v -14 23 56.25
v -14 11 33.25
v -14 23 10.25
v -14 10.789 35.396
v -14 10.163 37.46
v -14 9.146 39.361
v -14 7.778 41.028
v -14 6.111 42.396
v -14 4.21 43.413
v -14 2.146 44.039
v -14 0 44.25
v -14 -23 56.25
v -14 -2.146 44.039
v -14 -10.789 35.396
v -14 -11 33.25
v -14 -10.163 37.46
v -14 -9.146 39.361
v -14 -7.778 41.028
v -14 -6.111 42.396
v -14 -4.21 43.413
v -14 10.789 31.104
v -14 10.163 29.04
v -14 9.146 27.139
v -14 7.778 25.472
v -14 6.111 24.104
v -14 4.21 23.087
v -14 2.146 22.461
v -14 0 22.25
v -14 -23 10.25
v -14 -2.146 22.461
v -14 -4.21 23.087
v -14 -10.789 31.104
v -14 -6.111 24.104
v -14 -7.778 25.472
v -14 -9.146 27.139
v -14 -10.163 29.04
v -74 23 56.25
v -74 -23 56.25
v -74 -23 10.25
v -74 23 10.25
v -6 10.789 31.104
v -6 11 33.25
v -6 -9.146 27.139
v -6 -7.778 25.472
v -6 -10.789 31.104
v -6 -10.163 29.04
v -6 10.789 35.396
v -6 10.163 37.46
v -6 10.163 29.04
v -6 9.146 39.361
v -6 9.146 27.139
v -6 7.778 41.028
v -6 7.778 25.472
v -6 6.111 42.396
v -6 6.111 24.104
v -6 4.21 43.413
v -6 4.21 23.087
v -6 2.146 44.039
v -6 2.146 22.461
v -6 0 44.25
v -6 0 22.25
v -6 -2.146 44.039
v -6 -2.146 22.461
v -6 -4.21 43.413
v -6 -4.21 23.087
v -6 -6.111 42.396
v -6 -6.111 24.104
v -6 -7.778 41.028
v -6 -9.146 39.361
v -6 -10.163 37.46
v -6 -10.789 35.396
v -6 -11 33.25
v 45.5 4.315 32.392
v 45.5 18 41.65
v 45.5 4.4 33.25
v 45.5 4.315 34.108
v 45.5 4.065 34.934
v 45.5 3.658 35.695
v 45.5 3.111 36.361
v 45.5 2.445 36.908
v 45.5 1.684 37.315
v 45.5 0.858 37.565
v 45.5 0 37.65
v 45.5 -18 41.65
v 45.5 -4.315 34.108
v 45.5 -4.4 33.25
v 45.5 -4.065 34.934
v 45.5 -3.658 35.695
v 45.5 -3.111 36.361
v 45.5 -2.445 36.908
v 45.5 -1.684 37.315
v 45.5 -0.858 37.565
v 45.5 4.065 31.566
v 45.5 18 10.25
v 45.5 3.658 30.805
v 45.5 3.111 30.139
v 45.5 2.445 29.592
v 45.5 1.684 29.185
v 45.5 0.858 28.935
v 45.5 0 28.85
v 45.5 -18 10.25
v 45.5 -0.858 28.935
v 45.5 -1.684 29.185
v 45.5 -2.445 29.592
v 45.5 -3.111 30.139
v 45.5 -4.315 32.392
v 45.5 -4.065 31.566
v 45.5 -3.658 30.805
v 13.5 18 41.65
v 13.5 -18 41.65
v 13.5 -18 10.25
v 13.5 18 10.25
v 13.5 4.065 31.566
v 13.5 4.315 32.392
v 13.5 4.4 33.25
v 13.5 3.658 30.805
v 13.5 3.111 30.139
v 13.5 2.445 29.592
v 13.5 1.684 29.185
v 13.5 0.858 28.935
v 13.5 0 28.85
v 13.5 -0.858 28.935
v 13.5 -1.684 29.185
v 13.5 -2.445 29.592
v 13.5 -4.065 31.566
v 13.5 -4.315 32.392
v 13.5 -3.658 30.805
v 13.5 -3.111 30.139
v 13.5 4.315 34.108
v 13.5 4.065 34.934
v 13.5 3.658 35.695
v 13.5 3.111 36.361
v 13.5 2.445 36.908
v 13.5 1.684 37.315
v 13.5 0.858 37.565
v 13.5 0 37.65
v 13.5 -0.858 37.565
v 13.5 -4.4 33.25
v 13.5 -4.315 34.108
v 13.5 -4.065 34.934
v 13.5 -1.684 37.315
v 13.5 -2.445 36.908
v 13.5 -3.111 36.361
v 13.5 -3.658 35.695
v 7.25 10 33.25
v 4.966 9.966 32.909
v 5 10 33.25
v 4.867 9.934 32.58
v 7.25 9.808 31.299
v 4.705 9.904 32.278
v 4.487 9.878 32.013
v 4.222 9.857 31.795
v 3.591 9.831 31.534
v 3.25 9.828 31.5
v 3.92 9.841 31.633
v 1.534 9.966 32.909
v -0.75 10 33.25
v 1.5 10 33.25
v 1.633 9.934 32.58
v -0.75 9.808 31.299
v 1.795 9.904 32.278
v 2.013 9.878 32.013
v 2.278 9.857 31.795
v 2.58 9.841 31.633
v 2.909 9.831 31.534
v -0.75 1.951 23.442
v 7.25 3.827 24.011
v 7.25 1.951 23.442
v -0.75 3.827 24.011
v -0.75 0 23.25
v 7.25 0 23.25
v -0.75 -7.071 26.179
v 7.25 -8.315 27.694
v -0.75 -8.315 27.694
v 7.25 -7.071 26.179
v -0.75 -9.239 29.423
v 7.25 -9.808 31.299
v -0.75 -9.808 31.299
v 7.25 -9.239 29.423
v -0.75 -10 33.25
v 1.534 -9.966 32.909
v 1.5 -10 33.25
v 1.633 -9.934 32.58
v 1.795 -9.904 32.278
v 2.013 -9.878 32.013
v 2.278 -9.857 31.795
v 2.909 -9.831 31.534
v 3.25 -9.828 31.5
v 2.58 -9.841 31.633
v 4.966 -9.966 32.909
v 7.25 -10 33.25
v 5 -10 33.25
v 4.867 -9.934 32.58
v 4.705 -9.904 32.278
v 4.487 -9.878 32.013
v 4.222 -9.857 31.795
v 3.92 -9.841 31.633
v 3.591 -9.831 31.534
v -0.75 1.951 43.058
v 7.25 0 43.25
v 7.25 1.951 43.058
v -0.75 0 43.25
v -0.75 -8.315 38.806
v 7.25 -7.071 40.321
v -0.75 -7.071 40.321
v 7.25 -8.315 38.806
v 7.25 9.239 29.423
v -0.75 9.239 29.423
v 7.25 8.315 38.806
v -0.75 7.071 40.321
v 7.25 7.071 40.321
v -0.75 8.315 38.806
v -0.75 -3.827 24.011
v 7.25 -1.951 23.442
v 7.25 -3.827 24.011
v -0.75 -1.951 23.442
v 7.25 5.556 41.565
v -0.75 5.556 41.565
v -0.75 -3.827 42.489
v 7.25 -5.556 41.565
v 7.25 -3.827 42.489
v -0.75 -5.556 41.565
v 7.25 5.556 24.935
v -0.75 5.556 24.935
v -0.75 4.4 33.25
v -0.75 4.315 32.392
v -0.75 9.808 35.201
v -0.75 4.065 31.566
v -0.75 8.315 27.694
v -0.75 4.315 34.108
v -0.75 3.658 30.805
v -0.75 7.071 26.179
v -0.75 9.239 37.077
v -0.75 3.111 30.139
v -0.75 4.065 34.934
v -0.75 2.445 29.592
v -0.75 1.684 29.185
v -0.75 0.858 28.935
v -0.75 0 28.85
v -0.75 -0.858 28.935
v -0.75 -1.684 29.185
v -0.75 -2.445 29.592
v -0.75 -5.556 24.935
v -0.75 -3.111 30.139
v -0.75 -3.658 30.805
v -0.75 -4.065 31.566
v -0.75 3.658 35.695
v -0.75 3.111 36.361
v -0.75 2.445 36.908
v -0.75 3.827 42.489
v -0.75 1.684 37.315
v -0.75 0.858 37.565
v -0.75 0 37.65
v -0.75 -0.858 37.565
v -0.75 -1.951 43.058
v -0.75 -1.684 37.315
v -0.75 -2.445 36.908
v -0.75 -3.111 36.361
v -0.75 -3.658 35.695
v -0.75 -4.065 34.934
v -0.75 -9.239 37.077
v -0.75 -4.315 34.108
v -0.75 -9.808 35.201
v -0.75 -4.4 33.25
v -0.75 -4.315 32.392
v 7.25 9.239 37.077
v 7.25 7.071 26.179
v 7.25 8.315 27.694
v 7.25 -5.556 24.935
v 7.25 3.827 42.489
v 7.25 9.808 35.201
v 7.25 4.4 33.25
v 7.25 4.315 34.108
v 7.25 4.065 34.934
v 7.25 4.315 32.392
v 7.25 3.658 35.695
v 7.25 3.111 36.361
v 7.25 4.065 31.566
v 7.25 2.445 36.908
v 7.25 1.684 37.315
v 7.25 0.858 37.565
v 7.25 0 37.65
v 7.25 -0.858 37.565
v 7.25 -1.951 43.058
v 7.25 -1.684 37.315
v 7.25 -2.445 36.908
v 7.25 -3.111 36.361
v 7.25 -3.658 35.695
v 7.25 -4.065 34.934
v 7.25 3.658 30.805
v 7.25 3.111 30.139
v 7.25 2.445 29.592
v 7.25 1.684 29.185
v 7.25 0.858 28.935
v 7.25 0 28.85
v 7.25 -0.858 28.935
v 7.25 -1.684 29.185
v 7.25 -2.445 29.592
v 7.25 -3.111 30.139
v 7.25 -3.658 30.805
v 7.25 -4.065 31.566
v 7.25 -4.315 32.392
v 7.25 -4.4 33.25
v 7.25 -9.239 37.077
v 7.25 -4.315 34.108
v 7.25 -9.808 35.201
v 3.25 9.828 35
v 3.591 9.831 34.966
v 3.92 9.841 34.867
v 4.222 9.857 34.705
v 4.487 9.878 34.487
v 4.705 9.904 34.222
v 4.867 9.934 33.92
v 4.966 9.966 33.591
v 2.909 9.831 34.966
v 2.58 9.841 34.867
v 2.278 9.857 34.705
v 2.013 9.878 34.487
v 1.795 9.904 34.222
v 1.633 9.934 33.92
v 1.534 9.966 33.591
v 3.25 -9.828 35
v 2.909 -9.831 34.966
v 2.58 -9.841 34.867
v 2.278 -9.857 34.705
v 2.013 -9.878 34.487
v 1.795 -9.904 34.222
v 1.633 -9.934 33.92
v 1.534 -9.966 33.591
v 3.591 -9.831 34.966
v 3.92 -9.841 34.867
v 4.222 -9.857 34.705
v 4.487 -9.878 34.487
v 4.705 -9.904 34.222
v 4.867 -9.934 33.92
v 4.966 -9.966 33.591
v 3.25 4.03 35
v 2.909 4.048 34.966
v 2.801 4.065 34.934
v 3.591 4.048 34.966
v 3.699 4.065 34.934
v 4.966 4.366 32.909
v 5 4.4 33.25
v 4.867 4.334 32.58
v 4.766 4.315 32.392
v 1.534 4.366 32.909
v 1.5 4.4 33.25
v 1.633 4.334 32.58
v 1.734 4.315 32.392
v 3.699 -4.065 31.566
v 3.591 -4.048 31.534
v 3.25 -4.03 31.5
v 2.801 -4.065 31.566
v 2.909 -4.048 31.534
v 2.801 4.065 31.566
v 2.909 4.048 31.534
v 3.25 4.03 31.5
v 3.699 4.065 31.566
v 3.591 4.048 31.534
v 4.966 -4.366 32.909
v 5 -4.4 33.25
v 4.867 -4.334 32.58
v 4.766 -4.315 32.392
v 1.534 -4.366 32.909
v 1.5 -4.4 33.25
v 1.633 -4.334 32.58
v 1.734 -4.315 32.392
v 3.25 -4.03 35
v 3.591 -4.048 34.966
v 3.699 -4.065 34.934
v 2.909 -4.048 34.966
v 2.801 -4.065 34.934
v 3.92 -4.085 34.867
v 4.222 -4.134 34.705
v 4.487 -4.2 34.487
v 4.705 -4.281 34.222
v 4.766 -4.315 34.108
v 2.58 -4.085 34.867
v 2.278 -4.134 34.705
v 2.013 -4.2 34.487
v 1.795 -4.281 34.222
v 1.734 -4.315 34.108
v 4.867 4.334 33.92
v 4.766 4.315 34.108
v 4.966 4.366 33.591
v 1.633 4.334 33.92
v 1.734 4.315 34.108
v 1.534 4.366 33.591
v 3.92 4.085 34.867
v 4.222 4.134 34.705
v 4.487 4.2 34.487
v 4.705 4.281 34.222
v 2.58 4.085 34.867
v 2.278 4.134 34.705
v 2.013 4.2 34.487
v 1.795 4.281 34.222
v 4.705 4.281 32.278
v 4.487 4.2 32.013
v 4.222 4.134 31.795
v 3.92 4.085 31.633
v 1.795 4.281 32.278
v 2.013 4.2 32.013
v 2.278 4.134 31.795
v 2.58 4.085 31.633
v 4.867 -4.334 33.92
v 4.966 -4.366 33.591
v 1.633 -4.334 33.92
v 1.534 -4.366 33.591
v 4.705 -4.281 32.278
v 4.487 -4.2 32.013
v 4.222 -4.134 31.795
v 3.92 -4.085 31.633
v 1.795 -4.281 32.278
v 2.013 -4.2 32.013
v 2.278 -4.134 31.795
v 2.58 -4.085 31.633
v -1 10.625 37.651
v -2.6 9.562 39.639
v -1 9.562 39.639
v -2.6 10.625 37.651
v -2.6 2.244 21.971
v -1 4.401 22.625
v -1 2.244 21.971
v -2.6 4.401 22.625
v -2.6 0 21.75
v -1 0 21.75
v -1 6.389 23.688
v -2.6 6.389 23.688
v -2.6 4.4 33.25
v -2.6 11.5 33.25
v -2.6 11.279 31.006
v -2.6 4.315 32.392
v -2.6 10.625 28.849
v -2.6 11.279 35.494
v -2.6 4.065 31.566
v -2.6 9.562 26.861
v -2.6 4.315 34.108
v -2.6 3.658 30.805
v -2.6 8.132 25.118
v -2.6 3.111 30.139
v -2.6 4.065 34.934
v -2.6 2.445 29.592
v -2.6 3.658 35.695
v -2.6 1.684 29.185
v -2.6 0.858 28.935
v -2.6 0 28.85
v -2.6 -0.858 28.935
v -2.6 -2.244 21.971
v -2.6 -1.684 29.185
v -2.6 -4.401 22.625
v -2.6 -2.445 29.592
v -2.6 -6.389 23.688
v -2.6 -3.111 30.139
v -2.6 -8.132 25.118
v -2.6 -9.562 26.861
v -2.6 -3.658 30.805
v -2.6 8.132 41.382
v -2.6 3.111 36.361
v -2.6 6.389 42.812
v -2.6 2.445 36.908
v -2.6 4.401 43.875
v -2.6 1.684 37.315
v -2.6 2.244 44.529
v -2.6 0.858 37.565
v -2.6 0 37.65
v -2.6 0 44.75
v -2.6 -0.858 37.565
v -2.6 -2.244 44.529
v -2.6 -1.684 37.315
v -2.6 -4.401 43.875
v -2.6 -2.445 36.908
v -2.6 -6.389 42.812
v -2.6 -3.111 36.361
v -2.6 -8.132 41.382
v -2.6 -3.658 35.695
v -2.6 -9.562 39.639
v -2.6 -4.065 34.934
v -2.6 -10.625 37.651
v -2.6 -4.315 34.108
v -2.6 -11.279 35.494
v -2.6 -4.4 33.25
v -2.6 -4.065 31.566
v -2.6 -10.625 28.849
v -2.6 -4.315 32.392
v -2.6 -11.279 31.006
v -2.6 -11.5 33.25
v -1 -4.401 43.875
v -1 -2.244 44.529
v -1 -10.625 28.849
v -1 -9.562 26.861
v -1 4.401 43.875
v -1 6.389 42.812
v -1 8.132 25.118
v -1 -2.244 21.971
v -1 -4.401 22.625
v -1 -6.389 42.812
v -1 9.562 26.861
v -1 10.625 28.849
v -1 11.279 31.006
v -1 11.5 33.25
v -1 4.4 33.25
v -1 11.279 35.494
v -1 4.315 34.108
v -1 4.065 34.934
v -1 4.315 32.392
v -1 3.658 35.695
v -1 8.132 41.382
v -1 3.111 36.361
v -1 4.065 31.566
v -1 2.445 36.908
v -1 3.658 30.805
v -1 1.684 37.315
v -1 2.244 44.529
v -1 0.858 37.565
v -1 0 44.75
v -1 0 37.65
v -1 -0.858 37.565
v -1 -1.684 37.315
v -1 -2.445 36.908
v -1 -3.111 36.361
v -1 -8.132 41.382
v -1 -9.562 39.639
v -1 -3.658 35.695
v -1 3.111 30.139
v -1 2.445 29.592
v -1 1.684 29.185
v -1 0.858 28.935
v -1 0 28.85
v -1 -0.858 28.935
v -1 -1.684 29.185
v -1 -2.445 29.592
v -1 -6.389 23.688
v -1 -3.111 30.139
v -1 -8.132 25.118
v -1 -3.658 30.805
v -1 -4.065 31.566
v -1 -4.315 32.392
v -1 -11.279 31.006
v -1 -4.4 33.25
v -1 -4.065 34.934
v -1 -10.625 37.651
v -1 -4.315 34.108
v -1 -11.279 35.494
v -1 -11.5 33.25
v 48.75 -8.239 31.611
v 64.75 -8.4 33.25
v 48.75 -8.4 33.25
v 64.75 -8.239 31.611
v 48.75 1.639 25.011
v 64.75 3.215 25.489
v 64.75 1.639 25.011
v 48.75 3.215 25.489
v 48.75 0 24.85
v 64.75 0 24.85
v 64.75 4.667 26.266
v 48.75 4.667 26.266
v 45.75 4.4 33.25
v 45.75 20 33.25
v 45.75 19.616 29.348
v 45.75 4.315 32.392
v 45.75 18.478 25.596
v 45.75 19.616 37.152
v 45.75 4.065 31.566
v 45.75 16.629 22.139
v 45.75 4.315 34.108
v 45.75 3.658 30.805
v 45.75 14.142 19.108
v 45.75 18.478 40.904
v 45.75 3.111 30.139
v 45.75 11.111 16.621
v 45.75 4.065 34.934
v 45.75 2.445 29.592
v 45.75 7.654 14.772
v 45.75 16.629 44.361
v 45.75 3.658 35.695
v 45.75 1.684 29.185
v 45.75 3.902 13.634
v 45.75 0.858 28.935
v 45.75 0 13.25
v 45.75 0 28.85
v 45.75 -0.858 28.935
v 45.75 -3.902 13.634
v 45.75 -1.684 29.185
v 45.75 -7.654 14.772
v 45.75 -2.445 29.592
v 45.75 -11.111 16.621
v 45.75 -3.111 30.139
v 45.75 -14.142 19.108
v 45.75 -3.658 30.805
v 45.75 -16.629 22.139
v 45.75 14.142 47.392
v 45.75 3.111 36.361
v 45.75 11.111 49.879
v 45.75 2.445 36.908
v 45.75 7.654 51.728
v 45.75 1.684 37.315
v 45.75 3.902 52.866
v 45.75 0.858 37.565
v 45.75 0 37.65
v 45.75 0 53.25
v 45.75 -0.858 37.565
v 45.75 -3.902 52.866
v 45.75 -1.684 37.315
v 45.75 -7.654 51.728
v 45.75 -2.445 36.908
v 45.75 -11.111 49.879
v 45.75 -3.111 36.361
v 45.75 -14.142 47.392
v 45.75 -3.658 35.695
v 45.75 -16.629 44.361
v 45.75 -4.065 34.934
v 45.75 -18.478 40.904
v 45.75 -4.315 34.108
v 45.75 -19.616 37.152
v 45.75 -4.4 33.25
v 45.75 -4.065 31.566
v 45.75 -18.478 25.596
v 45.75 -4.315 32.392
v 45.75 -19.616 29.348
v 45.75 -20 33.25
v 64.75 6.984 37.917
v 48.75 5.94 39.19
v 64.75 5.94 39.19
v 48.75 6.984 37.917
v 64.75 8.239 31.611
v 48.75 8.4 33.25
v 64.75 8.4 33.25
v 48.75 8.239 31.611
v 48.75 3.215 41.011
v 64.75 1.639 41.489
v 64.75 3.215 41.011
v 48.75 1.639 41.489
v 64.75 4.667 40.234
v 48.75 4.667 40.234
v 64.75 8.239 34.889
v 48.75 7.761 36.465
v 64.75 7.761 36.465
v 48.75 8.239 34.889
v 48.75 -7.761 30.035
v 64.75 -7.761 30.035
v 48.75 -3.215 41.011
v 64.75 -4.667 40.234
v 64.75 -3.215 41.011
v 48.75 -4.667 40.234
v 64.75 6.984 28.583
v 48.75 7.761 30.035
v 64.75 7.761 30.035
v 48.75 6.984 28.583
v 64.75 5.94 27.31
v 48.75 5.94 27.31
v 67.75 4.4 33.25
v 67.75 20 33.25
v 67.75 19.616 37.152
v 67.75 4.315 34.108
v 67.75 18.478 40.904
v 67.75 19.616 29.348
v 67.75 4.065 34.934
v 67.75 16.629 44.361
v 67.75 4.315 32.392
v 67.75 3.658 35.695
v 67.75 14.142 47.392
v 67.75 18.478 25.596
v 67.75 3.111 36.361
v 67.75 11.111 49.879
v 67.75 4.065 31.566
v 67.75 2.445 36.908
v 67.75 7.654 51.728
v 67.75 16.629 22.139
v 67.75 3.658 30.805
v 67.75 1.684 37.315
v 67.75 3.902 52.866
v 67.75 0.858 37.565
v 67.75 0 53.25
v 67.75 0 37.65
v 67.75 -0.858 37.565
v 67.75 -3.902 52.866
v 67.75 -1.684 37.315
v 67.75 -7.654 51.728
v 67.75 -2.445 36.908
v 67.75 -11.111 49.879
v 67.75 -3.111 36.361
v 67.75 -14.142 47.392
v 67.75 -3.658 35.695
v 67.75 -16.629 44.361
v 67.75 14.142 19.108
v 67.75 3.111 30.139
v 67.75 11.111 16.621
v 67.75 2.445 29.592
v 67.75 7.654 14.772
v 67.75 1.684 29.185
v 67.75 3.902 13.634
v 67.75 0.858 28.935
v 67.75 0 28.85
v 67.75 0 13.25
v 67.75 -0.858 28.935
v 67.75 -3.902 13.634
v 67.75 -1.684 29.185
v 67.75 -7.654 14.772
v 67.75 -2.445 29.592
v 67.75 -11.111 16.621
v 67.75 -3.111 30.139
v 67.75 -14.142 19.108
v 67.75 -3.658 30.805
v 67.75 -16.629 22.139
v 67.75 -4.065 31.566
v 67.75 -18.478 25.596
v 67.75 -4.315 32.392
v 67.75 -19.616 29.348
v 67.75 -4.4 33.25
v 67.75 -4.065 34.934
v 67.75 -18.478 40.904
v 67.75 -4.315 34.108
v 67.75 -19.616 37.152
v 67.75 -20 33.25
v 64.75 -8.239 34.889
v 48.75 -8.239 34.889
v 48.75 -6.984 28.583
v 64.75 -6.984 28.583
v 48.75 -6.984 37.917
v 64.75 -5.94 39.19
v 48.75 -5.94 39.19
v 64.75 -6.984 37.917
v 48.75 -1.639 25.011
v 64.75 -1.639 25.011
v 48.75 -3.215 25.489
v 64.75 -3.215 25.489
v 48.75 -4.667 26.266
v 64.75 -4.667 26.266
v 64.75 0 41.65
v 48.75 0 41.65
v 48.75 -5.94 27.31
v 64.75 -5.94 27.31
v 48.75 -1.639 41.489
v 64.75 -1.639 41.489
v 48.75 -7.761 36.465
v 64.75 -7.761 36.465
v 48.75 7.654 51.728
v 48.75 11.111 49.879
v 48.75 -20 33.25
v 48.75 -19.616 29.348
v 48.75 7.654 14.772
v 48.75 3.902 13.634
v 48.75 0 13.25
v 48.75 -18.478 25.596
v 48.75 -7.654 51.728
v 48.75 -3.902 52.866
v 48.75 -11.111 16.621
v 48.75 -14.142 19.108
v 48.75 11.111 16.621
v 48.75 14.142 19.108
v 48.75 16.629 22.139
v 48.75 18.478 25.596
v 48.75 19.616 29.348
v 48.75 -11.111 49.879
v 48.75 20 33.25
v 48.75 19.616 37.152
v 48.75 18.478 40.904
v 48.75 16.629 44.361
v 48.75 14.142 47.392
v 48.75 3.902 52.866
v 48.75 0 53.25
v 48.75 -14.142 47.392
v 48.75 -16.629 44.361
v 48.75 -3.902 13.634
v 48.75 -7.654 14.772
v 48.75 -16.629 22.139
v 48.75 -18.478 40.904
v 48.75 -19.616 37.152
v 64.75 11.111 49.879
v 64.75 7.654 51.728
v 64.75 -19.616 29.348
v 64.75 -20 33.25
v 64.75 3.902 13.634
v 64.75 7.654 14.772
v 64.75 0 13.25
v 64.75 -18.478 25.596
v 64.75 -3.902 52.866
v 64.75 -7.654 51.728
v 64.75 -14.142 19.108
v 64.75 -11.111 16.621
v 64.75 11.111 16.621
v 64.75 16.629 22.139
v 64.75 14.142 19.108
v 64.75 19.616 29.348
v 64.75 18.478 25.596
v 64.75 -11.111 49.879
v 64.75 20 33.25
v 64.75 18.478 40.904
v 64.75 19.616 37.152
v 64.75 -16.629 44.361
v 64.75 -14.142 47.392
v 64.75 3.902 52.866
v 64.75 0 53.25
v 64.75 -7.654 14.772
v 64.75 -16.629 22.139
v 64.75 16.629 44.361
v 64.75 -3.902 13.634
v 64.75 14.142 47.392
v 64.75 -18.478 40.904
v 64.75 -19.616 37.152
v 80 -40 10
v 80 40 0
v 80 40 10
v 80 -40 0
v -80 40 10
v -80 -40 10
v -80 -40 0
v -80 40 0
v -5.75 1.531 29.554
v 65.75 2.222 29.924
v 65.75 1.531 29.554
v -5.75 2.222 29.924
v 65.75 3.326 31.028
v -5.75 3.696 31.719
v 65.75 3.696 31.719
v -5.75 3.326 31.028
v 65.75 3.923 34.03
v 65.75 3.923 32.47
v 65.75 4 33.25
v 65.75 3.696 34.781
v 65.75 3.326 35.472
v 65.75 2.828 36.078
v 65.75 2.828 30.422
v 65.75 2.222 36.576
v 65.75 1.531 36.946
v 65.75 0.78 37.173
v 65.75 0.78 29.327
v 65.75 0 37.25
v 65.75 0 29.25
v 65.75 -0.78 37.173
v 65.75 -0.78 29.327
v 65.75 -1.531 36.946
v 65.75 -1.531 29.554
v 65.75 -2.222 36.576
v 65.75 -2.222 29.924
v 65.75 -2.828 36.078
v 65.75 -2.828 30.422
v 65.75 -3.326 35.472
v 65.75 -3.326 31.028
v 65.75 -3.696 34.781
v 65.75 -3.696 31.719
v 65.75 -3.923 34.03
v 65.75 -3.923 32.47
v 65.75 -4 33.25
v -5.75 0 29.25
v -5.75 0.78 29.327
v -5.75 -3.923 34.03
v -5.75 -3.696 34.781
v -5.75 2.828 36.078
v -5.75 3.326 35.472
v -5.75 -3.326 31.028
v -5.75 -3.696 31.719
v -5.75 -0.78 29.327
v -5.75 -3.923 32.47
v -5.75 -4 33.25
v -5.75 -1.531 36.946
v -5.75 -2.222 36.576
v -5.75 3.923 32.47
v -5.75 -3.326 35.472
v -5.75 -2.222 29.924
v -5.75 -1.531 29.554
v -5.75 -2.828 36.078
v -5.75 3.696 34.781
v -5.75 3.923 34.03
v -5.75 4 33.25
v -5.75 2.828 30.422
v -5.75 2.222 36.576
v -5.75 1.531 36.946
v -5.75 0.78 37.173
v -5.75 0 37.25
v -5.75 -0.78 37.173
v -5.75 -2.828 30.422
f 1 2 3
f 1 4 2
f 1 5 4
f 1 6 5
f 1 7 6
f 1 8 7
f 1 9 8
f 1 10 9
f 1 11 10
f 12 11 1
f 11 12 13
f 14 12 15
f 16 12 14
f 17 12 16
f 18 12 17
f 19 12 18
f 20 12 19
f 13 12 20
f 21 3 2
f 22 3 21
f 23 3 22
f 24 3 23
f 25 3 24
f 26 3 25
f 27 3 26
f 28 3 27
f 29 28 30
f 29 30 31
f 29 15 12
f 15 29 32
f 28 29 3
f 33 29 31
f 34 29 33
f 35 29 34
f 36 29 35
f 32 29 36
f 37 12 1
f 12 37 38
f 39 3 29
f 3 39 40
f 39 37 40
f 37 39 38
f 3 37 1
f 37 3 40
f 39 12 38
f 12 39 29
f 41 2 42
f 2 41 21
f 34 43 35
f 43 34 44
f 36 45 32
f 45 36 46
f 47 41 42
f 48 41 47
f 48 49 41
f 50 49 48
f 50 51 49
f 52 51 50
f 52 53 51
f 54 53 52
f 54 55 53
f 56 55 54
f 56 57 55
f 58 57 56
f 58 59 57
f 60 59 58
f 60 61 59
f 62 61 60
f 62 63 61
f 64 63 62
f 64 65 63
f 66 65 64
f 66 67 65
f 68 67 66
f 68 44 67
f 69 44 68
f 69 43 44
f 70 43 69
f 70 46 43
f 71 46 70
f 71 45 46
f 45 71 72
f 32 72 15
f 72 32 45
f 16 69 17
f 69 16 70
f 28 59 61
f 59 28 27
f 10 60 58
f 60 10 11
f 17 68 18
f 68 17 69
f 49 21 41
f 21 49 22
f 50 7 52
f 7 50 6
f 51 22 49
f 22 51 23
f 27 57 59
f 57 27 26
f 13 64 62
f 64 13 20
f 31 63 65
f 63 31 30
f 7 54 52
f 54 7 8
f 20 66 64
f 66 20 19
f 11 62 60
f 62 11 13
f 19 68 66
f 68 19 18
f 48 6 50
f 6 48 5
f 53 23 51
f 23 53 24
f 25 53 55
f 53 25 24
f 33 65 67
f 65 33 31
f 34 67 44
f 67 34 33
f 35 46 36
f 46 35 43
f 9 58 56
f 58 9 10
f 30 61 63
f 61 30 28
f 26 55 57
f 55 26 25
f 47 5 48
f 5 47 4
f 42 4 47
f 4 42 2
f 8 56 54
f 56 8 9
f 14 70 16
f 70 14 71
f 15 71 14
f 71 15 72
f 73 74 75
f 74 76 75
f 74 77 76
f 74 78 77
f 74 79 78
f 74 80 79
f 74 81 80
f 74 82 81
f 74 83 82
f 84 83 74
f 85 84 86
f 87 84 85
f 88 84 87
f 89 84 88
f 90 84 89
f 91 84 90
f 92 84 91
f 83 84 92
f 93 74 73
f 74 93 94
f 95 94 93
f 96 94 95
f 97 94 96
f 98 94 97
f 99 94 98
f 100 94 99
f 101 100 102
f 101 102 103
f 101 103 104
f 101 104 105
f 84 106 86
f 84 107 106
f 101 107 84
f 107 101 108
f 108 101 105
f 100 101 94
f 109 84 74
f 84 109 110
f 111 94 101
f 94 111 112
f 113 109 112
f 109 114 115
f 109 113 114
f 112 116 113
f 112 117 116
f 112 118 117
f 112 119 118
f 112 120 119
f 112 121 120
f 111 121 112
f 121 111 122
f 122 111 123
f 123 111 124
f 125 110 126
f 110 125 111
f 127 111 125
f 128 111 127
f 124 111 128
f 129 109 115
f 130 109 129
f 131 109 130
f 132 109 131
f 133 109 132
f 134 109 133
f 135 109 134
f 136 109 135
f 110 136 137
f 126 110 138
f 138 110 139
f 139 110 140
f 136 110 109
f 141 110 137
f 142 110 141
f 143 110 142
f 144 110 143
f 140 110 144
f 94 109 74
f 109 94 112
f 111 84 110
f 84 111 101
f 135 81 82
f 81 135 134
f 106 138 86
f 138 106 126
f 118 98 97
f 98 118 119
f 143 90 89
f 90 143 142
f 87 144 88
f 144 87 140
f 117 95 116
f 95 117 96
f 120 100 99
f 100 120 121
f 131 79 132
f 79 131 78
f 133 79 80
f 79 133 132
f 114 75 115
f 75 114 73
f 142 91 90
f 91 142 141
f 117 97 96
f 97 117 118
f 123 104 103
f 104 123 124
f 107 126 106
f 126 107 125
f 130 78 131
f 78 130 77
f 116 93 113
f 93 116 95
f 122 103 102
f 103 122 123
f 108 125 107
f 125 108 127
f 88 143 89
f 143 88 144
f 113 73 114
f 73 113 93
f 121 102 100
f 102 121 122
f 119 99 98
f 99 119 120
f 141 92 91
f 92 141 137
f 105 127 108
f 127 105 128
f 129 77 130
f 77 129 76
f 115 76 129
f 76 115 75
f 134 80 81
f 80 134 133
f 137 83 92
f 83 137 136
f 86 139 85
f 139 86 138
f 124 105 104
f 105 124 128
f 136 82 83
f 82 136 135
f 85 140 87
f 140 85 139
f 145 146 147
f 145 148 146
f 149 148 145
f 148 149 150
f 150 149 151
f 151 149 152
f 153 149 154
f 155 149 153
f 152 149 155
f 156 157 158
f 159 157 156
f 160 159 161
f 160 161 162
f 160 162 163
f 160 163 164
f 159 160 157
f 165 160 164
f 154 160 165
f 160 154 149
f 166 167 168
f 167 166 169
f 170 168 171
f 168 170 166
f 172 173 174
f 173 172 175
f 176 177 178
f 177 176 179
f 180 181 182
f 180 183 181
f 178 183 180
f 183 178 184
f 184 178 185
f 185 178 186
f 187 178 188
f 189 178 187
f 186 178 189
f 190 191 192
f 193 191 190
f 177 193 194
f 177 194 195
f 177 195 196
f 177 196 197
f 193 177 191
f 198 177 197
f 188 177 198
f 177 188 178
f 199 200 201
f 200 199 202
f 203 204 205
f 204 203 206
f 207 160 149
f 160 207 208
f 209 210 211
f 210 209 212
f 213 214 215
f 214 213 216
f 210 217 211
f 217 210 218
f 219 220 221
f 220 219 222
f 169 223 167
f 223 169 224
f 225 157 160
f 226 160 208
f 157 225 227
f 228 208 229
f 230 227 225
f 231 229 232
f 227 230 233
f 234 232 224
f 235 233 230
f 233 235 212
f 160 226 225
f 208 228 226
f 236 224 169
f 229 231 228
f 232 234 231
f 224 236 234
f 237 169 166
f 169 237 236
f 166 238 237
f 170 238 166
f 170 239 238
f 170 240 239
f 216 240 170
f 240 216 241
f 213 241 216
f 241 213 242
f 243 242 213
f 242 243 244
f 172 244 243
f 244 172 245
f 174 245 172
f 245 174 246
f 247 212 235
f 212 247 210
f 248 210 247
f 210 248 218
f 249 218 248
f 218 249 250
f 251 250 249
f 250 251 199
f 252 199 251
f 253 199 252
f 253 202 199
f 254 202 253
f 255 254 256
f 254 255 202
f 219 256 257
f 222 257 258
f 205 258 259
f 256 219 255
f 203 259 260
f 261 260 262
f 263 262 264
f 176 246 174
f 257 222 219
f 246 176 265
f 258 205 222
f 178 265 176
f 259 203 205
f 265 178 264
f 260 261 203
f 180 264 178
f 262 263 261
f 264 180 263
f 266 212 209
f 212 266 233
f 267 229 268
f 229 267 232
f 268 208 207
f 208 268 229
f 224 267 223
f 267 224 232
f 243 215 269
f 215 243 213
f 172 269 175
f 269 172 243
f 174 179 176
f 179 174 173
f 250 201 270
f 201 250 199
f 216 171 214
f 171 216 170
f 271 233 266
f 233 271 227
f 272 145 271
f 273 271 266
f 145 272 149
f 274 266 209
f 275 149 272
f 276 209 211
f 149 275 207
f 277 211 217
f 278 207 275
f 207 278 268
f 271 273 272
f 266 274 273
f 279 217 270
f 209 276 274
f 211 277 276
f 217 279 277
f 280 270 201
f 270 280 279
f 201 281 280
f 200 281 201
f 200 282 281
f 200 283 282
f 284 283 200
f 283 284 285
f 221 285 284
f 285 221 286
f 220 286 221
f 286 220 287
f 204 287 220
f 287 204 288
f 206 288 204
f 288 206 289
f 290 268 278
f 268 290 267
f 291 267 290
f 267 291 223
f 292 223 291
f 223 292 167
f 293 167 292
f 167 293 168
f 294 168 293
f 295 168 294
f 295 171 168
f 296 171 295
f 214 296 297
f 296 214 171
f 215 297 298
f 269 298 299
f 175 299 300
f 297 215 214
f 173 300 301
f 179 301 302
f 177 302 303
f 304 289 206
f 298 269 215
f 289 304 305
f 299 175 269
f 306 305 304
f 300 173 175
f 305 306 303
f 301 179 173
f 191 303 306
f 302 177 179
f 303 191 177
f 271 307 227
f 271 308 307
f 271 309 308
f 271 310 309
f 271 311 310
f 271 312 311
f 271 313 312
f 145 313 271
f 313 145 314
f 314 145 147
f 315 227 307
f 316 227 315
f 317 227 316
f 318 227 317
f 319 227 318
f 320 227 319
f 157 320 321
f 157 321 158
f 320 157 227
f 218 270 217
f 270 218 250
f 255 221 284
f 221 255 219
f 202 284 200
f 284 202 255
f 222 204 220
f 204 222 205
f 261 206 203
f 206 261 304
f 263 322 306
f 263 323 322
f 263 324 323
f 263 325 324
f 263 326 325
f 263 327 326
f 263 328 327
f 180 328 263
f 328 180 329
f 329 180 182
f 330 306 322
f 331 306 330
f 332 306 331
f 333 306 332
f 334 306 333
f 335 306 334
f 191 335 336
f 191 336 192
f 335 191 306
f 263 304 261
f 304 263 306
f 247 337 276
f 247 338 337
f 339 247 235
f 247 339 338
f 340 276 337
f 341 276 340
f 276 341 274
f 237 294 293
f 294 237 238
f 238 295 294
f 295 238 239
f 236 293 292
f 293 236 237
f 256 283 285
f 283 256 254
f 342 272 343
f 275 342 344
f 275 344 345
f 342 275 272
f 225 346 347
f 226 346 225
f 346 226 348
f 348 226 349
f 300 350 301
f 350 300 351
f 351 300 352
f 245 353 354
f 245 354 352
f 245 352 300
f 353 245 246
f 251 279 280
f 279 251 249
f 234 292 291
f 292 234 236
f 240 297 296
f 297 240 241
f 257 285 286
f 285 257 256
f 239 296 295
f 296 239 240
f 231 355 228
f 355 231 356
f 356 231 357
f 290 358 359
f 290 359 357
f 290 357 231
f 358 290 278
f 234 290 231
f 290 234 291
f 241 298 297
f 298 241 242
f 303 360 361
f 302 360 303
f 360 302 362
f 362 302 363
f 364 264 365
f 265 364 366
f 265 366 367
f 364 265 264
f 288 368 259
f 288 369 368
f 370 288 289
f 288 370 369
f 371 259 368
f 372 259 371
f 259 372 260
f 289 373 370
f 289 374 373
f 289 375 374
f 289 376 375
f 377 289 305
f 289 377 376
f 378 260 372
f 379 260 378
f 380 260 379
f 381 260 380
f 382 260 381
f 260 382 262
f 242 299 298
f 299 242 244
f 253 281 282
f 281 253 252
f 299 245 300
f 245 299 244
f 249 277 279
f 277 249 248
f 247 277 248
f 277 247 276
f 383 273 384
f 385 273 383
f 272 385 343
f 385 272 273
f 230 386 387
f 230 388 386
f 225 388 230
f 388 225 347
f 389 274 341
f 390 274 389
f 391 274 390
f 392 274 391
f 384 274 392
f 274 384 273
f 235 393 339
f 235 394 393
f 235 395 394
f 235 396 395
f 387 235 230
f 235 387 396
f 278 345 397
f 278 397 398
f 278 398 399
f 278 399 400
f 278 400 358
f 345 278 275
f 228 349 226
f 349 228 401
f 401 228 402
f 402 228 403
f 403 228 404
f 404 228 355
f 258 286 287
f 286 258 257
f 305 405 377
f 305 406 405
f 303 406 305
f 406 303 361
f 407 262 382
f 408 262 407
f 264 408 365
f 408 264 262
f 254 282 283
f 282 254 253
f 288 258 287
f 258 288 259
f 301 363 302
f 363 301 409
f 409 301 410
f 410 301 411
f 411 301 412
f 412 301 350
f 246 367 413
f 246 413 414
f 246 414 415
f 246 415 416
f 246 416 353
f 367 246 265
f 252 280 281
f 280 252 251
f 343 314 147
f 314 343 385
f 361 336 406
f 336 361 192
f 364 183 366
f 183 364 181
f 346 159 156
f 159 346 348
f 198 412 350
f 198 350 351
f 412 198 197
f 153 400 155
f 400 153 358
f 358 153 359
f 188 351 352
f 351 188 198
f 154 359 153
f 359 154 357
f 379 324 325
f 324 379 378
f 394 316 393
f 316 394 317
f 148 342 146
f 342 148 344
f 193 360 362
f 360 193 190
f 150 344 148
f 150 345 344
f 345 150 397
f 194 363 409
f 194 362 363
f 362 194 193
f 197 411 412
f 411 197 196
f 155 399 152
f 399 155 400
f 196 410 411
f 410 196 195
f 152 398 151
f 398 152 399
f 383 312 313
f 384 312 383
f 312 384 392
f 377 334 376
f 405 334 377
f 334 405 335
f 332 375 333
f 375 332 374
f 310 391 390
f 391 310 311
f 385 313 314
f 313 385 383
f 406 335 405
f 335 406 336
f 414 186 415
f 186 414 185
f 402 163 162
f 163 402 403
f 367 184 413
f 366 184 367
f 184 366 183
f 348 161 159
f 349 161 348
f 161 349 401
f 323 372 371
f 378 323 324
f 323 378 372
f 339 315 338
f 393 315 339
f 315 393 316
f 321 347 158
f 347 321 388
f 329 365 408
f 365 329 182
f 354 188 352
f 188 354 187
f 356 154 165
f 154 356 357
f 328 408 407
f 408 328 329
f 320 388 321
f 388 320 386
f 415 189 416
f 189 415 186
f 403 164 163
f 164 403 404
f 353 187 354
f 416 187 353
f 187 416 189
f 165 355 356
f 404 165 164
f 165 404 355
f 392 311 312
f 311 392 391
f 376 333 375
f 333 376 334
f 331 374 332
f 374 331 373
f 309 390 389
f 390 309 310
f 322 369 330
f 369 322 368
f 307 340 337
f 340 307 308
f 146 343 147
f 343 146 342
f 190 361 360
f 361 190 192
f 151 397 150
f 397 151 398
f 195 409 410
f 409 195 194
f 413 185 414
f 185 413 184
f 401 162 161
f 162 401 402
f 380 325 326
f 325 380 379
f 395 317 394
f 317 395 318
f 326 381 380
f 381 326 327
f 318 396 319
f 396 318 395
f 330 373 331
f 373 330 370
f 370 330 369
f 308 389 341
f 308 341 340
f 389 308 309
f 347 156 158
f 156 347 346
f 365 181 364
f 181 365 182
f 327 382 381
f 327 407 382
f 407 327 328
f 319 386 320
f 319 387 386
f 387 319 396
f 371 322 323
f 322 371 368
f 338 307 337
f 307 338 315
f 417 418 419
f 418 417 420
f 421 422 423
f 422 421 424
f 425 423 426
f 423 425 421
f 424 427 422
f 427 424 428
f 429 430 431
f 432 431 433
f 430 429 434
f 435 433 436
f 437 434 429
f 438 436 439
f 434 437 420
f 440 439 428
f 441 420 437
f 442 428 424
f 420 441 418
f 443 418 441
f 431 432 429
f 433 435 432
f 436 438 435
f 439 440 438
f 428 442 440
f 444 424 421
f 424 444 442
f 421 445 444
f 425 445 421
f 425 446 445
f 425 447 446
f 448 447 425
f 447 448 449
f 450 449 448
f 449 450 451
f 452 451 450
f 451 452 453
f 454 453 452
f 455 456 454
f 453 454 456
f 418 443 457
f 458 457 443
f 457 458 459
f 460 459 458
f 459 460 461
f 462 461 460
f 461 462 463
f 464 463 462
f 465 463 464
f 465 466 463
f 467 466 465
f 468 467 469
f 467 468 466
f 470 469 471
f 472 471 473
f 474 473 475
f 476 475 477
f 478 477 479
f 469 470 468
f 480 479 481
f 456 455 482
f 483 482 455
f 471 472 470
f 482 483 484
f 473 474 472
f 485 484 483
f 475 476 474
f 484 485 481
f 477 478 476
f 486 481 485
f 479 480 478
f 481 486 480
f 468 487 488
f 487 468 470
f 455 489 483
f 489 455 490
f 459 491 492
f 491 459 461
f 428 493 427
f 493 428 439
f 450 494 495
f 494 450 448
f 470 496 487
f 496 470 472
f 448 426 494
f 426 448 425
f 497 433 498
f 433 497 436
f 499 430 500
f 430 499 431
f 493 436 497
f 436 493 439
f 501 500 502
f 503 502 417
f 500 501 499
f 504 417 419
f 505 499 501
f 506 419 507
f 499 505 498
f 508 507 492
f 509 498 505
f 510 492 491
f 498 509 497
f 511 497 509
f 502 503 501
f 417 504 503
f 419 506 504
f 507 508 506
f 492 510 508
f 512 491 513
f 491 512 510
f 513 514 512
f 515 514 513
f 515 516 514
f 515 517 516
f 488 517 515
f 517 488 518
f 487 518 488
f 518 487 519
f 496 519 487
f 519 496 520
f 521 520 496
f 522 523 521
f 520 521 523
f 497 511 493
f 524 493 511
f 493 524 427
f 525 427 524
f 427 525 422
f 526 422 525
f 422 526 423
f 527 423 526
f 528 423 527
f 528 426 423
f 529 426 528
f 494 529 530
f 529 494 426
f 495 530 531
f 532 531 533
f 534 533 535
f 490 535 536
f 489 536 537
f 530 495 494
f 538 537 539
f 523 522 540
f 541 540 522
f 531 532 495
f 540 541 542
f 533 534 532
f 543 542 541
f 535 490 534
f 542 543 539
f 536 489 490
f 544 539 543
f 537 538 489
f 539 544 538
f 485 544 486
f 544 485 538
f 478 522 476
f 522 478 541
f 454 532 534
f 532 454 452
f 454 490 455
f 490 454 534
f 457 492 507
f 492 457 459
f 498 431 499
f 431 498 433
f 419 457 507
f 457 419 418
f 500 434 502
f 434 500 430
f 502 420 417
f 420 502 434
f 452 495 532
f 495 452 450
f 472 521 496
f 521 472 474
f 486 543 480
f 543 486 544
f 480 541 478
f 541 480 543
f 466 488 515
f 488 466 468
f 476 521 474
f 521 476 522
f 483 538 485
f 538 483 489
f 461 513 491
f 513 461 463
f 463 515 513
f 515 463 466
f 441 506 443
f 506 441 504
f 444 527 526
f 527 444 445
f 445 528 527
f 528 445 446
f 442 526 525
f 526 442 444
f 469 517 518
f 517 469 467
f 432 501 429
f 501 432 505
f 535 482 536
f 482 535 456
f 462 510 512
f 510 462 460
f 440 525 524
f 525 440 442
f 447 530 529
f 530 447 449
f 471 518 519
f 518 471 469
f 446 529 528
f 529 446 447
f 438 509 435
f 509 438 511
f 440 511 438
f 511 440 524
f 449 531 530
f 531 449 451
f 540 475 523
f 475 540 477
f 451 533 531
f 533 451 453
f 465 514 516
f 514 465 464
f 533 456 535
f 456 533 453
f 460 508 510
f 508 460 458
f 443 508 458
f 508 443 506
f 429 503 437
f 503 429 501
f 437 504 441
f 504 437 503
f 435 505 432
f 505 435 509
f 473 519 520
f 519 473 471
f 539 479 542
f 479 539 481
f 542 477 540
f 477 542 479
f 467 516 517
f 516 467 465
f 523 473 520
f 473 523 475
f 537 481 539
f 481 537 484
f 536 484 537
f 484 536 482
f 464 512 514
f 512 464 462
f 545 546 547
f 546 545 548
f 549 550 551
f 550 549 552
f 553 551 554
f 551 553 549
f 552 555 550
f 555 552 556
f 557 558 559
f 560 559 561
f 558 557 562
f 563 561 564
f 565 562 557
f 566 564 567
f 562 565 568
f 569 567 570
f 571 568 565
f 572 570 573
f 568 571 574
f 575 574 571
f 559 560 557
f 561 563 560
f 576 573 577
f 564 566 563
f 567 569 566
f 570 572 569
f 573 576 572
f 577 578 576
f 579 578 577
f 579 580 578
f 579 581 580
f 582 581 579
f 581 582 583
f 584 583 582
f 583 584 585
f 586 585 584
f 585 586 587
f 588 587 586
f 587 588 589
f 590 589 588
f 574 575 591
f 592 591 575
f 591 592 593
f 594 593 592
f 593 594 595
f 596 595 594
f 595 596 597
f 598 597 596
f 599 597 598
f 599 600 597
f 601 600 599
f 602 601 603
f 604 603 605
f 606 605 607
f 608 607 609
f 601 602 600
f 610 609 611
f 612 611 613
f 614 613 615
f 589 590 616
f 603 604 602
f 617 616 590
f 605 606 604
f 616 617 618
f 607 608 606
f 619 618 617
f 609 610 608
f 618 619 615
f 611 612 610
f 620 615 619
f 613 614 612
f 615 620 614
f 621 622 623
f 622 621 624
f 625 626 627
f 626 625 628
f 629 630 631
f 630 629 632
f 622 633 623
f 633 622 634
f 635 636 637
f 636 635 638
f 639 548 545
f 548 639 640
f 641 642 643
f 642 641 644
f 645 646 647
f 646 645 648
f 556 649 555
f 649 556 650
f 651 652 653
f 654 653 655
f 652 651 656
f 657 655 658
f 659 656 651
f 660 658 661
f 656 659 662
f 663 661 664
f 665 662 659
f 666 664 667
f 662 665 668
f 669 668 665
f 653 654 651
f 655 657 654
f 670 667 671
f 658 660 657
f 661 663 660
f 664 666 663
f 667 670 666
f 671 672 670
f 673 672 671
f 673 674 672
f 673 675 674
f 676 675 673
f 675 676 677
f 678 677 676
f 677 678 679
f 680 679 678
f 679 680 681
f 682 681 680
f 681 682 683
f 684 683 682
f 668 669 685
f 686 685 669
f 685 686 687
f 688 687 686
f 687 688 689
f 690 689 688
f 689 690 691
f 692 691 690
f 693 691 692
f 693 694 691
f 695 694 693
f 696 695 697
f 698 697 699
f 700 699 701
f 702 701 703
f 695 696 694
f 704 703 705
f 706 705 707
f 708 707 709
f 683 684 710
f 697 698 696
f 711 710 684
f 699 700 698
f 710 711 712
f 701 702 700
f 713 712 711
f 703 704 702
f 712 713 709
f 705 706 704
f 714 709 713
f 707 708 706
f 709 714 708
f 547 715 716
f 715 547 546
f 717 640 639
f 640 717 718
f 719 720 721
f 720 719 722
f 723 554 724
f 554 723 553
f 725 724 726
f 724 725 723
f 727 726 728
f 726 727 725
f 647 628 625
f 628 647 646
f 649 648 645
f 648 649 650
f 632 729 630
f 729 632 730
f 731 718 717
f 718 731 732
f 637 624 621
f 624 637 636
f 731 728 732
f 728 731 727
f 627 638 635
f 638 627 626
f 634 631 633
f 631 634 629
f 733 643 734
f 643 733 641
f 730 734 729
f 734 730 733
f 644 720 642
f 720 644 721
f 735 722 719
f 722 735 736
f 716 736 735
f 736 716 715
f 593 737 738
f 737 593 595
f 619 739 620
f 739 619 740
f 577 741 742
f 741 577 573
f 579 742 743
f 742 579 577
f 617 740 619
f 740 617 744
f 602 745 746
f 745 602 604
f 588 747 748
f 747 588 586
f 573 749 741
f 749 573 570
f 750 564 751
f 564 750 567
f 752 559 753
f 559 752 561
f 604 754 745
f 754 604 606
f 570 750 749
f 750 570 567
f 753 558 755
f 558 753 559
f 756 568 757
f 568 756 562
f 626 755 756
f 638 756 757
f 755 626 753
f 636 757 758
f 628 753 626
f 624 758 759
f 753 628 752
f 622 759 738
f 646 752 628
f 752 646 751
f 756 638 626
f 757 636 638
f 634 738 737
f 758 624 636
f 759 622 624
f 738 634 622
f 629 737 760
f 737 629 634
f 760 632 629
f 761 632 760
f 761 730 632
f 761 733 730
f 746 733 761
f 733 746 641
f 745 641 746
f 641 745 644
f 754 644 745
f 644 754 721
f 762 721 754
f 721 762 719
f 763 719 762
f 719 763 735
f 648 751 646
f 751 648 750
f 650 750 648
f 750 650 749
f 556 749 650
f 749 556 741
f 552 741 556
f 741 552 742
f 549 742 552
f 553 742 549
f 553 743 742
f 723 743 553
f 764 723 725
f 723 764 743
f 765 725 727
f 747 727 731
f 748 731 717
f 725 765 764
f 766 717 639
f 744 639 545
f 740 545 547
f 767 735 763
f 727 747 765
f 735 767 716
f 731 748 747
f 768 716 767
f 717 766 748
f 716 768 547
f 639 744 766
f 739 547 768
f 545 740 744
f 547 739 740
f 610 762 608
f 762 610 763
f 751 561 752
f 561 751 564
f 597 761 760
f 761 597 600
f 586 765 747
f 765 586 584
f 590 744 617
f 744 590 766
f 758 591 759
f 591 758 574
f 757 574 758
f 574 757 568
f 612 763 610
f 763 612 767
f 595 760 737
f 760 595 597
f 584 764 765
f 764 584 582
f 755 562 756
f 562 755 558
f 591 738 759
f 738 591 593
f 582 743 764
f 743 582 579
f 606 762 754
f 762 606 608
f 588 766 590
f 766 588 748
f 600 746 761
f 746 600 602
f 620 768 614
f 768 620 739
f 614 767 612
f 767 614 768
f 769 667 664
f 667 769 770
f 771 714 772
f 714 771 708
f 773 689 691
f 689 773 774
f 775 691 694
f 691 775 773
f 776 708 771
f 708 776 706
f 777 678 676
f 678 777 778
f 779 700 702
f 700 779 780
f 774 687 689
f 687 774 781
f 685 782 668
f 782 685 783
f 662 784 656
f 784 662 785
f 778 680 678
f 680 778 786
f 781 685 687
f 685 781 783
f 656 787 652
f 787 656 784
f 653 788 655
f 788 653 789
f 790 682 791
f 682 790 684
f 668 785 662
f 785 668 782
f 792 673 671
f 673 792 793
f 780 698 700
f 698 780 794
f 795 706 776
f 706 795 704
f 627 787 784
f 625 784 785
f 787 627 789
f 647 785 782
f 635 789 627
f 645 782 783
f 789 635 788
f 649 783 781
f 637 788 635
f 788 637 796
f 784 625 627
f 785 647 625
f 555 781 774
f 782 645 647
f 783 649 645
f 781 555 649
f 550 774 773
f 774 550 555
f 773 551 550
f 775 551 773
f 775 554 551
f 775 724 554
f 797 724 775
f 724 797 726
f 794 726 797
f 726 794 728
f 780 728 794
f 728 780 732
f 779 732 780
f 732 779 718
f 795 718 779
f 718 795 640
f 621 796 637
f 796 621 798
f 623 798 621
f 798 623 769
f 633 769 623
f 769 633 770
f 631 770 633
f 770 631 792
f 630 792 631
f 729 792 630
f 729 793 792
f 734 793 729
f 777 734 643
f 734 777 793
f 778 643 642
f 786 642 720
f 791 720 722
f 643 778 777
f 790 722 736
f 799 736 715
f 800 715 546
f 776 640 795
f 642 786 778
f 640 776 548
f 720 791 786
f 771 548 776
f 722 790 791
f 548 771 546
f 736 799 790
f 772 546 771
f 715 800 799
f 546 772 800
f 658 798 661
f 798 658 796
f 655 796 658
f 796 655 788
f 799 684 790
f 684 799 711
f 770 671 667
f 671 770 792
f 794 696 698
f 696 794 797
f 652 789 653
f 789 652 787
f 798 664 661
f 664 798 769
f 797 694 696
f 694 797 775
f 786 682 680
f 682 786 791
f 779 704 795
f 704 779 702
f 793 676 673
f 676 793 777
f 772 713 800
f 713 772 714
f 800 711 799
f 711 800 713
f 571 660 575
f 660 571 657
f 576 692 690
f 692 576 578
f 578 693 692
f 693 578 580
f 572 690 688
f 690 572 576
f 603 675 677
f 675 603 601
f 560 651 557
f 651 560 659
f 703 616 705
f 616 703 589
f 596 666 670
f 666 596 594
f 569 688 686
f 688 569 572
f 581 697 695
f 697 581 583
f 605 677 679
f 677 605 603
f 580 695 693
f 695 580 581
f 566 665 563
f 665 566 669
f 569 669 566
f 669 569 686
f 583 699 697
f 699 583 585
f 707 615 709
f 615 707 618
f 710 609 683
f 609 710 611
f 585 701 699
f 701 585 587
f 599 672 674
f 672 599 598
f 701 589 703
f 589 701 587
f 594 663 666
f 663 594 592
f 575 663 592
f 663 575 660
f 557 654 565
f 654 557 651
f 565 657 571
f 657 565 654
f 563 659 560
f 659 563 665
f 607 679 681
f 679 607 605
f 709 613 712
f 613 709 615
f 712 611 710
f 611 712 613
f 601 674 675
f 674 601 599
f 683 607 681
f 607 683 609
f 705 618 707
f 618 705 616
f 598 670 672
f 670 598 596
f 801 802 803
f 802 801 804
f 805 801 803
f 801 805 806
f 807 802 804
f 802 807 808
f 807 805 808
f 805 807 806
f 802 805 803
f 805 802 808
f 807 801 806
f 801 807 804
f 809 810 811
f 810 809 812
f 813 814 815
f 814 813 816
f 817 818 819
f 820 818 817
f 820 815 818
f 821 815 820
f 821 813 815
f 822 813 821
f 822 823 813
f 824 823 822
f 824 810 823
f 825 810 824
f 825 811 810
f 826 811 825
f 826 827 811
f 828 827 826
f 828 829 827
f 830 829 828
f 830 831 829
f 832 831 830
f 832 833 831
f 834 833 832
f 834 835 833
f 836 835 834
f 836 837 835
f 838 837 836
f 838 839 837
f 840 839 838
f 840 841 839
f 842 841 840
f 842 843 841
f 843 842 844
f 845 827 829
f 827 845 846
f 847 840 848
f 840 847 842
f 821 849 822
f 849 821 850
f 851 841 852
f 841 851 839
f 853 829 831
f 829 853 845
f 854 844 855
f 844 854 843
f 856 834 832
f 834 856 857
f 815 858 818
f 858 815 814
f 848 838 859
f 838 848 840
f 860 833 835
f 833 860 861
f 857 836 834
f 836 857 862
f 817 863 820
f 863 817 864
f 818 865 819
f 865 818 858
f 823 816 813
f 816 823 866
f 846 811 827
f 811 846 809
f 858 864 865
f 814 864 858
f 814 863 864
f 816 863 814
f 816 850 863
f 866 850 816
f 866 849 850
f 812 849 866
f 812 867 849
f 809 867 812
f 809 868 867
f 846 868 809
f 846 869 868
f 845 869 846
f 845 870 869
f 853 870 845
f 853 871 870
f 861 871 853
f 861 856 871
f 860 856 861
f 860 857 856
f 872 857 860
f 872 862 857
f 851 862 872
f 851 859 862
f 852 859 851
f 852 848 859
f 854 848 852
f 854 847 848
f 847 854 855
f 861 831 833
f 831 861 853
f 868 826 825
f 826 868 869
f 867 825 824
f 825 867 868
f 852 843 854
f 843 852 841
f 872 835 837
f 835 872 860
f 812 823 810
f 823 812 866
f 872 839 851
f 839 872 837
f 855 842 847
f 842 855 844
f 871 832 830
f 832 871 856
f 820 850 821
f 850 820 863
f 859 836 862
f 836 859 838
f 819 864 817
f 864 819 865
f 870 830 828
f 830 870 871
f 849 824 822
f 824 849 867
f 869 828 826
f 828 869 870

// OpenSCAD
$fn = 32;

// ------------------------------------------------------------------------
// Motor drive station: motor 60 x 46 mm, shaft d8, pulley d40
// Every part is its own module, assembly() places every instance.
// ------------------------------------------------------------------------

// --- part 1 ---
module station_bed() {
  difference() {
    translate([-80, -40, 0]) cube([160, 80, 10]);
  }
}

// --- part 2 ---
module drive_motor() {
  union() {
    translate([-30, -23, 0]) cube([60, 46, 46]);
    translate([34, 0, 23]) rotate([0, 90, 0]) cylinder(h = 8, d = 22, center = true);
  }
}

// --- part 3 ---
module pillow_block() {
  difference() {
    translate([-16, -18, 0]) cube([32, 36, 31.4]);
    translate([0, 0, 23]) rotate([0, 90, 0]) cylinder(h = 34, d = 8.8, center = true);
  }
}

// --- part 4 ---
module drive_shaft() {
  translate([0, 0, -35.75]) cylinder(h = 71.5, d = 8);
}

// --- part 5 ---
module shaft_collar() {
  difference() {
    cylinder(h = 8, d = 20);
    translate([0, 0, -1]) cylinder(h = 10, d = 8.8);
    translate([0, 0, 4]) rotate([90, 0, 0]) cylinder(h = 22, d = 3.5, center = true);
  }
}

// --- part 6 ---
module collar_washer() {
  difference() {
      translate([0, 0, 0]) cylinder(h = 1.6, d = 23);
      translate([0, 0, -1]) cylinder(h = 3.6, d = 8.8);
    }
}

// --- part 7 ---
module drive_pulley() {
  difference() {
    union() {
      cylinder(h = 22, d = 16.8);
      cylinder(h = 3, d = 40);
      translate([0, 0, 19]) cylinder(h = 3, d = 40);
    }
    translate([0, 0, -1]) cylinder(h = 24, d = 8.8);
  }
}

// --- assembly ---
module assembly() {
  color([0.80, 0.24, 0.20]) translate([0, 0, 0]) rotate([0, 0, 0]) station_bed();
  color([0.20, 0.45, 0.75]) translate([-44, 0, 10.25]) rotate([0, 0, 0]) drive_motor();
  color([0.25, 0.62, 0.32]) translate([29.5, 0, 10.25]) rotate([0, 0, 0]) pillow_block();
  color([0.92, 0.70, 0.18]) translate([30, 0, 33.25]) rotate([0, 90, 0]) drive_shaft();
  color([0.58, 0.35, 0.70]) translate([-0.75, 0, 33.25]) rotate([0, 90, 0]) shaft_collar();
  color([0.16, 0.66, 0.66]) translate([-2.6, 0, 33.25]) rotate([0, 90, 0]) collar_washer();
  color([0.85, 0.48, 0.18]) translate([45.75, 0, 33.25]) rotate([0, 90, 0]) drive_pulley();
}

assembly();
